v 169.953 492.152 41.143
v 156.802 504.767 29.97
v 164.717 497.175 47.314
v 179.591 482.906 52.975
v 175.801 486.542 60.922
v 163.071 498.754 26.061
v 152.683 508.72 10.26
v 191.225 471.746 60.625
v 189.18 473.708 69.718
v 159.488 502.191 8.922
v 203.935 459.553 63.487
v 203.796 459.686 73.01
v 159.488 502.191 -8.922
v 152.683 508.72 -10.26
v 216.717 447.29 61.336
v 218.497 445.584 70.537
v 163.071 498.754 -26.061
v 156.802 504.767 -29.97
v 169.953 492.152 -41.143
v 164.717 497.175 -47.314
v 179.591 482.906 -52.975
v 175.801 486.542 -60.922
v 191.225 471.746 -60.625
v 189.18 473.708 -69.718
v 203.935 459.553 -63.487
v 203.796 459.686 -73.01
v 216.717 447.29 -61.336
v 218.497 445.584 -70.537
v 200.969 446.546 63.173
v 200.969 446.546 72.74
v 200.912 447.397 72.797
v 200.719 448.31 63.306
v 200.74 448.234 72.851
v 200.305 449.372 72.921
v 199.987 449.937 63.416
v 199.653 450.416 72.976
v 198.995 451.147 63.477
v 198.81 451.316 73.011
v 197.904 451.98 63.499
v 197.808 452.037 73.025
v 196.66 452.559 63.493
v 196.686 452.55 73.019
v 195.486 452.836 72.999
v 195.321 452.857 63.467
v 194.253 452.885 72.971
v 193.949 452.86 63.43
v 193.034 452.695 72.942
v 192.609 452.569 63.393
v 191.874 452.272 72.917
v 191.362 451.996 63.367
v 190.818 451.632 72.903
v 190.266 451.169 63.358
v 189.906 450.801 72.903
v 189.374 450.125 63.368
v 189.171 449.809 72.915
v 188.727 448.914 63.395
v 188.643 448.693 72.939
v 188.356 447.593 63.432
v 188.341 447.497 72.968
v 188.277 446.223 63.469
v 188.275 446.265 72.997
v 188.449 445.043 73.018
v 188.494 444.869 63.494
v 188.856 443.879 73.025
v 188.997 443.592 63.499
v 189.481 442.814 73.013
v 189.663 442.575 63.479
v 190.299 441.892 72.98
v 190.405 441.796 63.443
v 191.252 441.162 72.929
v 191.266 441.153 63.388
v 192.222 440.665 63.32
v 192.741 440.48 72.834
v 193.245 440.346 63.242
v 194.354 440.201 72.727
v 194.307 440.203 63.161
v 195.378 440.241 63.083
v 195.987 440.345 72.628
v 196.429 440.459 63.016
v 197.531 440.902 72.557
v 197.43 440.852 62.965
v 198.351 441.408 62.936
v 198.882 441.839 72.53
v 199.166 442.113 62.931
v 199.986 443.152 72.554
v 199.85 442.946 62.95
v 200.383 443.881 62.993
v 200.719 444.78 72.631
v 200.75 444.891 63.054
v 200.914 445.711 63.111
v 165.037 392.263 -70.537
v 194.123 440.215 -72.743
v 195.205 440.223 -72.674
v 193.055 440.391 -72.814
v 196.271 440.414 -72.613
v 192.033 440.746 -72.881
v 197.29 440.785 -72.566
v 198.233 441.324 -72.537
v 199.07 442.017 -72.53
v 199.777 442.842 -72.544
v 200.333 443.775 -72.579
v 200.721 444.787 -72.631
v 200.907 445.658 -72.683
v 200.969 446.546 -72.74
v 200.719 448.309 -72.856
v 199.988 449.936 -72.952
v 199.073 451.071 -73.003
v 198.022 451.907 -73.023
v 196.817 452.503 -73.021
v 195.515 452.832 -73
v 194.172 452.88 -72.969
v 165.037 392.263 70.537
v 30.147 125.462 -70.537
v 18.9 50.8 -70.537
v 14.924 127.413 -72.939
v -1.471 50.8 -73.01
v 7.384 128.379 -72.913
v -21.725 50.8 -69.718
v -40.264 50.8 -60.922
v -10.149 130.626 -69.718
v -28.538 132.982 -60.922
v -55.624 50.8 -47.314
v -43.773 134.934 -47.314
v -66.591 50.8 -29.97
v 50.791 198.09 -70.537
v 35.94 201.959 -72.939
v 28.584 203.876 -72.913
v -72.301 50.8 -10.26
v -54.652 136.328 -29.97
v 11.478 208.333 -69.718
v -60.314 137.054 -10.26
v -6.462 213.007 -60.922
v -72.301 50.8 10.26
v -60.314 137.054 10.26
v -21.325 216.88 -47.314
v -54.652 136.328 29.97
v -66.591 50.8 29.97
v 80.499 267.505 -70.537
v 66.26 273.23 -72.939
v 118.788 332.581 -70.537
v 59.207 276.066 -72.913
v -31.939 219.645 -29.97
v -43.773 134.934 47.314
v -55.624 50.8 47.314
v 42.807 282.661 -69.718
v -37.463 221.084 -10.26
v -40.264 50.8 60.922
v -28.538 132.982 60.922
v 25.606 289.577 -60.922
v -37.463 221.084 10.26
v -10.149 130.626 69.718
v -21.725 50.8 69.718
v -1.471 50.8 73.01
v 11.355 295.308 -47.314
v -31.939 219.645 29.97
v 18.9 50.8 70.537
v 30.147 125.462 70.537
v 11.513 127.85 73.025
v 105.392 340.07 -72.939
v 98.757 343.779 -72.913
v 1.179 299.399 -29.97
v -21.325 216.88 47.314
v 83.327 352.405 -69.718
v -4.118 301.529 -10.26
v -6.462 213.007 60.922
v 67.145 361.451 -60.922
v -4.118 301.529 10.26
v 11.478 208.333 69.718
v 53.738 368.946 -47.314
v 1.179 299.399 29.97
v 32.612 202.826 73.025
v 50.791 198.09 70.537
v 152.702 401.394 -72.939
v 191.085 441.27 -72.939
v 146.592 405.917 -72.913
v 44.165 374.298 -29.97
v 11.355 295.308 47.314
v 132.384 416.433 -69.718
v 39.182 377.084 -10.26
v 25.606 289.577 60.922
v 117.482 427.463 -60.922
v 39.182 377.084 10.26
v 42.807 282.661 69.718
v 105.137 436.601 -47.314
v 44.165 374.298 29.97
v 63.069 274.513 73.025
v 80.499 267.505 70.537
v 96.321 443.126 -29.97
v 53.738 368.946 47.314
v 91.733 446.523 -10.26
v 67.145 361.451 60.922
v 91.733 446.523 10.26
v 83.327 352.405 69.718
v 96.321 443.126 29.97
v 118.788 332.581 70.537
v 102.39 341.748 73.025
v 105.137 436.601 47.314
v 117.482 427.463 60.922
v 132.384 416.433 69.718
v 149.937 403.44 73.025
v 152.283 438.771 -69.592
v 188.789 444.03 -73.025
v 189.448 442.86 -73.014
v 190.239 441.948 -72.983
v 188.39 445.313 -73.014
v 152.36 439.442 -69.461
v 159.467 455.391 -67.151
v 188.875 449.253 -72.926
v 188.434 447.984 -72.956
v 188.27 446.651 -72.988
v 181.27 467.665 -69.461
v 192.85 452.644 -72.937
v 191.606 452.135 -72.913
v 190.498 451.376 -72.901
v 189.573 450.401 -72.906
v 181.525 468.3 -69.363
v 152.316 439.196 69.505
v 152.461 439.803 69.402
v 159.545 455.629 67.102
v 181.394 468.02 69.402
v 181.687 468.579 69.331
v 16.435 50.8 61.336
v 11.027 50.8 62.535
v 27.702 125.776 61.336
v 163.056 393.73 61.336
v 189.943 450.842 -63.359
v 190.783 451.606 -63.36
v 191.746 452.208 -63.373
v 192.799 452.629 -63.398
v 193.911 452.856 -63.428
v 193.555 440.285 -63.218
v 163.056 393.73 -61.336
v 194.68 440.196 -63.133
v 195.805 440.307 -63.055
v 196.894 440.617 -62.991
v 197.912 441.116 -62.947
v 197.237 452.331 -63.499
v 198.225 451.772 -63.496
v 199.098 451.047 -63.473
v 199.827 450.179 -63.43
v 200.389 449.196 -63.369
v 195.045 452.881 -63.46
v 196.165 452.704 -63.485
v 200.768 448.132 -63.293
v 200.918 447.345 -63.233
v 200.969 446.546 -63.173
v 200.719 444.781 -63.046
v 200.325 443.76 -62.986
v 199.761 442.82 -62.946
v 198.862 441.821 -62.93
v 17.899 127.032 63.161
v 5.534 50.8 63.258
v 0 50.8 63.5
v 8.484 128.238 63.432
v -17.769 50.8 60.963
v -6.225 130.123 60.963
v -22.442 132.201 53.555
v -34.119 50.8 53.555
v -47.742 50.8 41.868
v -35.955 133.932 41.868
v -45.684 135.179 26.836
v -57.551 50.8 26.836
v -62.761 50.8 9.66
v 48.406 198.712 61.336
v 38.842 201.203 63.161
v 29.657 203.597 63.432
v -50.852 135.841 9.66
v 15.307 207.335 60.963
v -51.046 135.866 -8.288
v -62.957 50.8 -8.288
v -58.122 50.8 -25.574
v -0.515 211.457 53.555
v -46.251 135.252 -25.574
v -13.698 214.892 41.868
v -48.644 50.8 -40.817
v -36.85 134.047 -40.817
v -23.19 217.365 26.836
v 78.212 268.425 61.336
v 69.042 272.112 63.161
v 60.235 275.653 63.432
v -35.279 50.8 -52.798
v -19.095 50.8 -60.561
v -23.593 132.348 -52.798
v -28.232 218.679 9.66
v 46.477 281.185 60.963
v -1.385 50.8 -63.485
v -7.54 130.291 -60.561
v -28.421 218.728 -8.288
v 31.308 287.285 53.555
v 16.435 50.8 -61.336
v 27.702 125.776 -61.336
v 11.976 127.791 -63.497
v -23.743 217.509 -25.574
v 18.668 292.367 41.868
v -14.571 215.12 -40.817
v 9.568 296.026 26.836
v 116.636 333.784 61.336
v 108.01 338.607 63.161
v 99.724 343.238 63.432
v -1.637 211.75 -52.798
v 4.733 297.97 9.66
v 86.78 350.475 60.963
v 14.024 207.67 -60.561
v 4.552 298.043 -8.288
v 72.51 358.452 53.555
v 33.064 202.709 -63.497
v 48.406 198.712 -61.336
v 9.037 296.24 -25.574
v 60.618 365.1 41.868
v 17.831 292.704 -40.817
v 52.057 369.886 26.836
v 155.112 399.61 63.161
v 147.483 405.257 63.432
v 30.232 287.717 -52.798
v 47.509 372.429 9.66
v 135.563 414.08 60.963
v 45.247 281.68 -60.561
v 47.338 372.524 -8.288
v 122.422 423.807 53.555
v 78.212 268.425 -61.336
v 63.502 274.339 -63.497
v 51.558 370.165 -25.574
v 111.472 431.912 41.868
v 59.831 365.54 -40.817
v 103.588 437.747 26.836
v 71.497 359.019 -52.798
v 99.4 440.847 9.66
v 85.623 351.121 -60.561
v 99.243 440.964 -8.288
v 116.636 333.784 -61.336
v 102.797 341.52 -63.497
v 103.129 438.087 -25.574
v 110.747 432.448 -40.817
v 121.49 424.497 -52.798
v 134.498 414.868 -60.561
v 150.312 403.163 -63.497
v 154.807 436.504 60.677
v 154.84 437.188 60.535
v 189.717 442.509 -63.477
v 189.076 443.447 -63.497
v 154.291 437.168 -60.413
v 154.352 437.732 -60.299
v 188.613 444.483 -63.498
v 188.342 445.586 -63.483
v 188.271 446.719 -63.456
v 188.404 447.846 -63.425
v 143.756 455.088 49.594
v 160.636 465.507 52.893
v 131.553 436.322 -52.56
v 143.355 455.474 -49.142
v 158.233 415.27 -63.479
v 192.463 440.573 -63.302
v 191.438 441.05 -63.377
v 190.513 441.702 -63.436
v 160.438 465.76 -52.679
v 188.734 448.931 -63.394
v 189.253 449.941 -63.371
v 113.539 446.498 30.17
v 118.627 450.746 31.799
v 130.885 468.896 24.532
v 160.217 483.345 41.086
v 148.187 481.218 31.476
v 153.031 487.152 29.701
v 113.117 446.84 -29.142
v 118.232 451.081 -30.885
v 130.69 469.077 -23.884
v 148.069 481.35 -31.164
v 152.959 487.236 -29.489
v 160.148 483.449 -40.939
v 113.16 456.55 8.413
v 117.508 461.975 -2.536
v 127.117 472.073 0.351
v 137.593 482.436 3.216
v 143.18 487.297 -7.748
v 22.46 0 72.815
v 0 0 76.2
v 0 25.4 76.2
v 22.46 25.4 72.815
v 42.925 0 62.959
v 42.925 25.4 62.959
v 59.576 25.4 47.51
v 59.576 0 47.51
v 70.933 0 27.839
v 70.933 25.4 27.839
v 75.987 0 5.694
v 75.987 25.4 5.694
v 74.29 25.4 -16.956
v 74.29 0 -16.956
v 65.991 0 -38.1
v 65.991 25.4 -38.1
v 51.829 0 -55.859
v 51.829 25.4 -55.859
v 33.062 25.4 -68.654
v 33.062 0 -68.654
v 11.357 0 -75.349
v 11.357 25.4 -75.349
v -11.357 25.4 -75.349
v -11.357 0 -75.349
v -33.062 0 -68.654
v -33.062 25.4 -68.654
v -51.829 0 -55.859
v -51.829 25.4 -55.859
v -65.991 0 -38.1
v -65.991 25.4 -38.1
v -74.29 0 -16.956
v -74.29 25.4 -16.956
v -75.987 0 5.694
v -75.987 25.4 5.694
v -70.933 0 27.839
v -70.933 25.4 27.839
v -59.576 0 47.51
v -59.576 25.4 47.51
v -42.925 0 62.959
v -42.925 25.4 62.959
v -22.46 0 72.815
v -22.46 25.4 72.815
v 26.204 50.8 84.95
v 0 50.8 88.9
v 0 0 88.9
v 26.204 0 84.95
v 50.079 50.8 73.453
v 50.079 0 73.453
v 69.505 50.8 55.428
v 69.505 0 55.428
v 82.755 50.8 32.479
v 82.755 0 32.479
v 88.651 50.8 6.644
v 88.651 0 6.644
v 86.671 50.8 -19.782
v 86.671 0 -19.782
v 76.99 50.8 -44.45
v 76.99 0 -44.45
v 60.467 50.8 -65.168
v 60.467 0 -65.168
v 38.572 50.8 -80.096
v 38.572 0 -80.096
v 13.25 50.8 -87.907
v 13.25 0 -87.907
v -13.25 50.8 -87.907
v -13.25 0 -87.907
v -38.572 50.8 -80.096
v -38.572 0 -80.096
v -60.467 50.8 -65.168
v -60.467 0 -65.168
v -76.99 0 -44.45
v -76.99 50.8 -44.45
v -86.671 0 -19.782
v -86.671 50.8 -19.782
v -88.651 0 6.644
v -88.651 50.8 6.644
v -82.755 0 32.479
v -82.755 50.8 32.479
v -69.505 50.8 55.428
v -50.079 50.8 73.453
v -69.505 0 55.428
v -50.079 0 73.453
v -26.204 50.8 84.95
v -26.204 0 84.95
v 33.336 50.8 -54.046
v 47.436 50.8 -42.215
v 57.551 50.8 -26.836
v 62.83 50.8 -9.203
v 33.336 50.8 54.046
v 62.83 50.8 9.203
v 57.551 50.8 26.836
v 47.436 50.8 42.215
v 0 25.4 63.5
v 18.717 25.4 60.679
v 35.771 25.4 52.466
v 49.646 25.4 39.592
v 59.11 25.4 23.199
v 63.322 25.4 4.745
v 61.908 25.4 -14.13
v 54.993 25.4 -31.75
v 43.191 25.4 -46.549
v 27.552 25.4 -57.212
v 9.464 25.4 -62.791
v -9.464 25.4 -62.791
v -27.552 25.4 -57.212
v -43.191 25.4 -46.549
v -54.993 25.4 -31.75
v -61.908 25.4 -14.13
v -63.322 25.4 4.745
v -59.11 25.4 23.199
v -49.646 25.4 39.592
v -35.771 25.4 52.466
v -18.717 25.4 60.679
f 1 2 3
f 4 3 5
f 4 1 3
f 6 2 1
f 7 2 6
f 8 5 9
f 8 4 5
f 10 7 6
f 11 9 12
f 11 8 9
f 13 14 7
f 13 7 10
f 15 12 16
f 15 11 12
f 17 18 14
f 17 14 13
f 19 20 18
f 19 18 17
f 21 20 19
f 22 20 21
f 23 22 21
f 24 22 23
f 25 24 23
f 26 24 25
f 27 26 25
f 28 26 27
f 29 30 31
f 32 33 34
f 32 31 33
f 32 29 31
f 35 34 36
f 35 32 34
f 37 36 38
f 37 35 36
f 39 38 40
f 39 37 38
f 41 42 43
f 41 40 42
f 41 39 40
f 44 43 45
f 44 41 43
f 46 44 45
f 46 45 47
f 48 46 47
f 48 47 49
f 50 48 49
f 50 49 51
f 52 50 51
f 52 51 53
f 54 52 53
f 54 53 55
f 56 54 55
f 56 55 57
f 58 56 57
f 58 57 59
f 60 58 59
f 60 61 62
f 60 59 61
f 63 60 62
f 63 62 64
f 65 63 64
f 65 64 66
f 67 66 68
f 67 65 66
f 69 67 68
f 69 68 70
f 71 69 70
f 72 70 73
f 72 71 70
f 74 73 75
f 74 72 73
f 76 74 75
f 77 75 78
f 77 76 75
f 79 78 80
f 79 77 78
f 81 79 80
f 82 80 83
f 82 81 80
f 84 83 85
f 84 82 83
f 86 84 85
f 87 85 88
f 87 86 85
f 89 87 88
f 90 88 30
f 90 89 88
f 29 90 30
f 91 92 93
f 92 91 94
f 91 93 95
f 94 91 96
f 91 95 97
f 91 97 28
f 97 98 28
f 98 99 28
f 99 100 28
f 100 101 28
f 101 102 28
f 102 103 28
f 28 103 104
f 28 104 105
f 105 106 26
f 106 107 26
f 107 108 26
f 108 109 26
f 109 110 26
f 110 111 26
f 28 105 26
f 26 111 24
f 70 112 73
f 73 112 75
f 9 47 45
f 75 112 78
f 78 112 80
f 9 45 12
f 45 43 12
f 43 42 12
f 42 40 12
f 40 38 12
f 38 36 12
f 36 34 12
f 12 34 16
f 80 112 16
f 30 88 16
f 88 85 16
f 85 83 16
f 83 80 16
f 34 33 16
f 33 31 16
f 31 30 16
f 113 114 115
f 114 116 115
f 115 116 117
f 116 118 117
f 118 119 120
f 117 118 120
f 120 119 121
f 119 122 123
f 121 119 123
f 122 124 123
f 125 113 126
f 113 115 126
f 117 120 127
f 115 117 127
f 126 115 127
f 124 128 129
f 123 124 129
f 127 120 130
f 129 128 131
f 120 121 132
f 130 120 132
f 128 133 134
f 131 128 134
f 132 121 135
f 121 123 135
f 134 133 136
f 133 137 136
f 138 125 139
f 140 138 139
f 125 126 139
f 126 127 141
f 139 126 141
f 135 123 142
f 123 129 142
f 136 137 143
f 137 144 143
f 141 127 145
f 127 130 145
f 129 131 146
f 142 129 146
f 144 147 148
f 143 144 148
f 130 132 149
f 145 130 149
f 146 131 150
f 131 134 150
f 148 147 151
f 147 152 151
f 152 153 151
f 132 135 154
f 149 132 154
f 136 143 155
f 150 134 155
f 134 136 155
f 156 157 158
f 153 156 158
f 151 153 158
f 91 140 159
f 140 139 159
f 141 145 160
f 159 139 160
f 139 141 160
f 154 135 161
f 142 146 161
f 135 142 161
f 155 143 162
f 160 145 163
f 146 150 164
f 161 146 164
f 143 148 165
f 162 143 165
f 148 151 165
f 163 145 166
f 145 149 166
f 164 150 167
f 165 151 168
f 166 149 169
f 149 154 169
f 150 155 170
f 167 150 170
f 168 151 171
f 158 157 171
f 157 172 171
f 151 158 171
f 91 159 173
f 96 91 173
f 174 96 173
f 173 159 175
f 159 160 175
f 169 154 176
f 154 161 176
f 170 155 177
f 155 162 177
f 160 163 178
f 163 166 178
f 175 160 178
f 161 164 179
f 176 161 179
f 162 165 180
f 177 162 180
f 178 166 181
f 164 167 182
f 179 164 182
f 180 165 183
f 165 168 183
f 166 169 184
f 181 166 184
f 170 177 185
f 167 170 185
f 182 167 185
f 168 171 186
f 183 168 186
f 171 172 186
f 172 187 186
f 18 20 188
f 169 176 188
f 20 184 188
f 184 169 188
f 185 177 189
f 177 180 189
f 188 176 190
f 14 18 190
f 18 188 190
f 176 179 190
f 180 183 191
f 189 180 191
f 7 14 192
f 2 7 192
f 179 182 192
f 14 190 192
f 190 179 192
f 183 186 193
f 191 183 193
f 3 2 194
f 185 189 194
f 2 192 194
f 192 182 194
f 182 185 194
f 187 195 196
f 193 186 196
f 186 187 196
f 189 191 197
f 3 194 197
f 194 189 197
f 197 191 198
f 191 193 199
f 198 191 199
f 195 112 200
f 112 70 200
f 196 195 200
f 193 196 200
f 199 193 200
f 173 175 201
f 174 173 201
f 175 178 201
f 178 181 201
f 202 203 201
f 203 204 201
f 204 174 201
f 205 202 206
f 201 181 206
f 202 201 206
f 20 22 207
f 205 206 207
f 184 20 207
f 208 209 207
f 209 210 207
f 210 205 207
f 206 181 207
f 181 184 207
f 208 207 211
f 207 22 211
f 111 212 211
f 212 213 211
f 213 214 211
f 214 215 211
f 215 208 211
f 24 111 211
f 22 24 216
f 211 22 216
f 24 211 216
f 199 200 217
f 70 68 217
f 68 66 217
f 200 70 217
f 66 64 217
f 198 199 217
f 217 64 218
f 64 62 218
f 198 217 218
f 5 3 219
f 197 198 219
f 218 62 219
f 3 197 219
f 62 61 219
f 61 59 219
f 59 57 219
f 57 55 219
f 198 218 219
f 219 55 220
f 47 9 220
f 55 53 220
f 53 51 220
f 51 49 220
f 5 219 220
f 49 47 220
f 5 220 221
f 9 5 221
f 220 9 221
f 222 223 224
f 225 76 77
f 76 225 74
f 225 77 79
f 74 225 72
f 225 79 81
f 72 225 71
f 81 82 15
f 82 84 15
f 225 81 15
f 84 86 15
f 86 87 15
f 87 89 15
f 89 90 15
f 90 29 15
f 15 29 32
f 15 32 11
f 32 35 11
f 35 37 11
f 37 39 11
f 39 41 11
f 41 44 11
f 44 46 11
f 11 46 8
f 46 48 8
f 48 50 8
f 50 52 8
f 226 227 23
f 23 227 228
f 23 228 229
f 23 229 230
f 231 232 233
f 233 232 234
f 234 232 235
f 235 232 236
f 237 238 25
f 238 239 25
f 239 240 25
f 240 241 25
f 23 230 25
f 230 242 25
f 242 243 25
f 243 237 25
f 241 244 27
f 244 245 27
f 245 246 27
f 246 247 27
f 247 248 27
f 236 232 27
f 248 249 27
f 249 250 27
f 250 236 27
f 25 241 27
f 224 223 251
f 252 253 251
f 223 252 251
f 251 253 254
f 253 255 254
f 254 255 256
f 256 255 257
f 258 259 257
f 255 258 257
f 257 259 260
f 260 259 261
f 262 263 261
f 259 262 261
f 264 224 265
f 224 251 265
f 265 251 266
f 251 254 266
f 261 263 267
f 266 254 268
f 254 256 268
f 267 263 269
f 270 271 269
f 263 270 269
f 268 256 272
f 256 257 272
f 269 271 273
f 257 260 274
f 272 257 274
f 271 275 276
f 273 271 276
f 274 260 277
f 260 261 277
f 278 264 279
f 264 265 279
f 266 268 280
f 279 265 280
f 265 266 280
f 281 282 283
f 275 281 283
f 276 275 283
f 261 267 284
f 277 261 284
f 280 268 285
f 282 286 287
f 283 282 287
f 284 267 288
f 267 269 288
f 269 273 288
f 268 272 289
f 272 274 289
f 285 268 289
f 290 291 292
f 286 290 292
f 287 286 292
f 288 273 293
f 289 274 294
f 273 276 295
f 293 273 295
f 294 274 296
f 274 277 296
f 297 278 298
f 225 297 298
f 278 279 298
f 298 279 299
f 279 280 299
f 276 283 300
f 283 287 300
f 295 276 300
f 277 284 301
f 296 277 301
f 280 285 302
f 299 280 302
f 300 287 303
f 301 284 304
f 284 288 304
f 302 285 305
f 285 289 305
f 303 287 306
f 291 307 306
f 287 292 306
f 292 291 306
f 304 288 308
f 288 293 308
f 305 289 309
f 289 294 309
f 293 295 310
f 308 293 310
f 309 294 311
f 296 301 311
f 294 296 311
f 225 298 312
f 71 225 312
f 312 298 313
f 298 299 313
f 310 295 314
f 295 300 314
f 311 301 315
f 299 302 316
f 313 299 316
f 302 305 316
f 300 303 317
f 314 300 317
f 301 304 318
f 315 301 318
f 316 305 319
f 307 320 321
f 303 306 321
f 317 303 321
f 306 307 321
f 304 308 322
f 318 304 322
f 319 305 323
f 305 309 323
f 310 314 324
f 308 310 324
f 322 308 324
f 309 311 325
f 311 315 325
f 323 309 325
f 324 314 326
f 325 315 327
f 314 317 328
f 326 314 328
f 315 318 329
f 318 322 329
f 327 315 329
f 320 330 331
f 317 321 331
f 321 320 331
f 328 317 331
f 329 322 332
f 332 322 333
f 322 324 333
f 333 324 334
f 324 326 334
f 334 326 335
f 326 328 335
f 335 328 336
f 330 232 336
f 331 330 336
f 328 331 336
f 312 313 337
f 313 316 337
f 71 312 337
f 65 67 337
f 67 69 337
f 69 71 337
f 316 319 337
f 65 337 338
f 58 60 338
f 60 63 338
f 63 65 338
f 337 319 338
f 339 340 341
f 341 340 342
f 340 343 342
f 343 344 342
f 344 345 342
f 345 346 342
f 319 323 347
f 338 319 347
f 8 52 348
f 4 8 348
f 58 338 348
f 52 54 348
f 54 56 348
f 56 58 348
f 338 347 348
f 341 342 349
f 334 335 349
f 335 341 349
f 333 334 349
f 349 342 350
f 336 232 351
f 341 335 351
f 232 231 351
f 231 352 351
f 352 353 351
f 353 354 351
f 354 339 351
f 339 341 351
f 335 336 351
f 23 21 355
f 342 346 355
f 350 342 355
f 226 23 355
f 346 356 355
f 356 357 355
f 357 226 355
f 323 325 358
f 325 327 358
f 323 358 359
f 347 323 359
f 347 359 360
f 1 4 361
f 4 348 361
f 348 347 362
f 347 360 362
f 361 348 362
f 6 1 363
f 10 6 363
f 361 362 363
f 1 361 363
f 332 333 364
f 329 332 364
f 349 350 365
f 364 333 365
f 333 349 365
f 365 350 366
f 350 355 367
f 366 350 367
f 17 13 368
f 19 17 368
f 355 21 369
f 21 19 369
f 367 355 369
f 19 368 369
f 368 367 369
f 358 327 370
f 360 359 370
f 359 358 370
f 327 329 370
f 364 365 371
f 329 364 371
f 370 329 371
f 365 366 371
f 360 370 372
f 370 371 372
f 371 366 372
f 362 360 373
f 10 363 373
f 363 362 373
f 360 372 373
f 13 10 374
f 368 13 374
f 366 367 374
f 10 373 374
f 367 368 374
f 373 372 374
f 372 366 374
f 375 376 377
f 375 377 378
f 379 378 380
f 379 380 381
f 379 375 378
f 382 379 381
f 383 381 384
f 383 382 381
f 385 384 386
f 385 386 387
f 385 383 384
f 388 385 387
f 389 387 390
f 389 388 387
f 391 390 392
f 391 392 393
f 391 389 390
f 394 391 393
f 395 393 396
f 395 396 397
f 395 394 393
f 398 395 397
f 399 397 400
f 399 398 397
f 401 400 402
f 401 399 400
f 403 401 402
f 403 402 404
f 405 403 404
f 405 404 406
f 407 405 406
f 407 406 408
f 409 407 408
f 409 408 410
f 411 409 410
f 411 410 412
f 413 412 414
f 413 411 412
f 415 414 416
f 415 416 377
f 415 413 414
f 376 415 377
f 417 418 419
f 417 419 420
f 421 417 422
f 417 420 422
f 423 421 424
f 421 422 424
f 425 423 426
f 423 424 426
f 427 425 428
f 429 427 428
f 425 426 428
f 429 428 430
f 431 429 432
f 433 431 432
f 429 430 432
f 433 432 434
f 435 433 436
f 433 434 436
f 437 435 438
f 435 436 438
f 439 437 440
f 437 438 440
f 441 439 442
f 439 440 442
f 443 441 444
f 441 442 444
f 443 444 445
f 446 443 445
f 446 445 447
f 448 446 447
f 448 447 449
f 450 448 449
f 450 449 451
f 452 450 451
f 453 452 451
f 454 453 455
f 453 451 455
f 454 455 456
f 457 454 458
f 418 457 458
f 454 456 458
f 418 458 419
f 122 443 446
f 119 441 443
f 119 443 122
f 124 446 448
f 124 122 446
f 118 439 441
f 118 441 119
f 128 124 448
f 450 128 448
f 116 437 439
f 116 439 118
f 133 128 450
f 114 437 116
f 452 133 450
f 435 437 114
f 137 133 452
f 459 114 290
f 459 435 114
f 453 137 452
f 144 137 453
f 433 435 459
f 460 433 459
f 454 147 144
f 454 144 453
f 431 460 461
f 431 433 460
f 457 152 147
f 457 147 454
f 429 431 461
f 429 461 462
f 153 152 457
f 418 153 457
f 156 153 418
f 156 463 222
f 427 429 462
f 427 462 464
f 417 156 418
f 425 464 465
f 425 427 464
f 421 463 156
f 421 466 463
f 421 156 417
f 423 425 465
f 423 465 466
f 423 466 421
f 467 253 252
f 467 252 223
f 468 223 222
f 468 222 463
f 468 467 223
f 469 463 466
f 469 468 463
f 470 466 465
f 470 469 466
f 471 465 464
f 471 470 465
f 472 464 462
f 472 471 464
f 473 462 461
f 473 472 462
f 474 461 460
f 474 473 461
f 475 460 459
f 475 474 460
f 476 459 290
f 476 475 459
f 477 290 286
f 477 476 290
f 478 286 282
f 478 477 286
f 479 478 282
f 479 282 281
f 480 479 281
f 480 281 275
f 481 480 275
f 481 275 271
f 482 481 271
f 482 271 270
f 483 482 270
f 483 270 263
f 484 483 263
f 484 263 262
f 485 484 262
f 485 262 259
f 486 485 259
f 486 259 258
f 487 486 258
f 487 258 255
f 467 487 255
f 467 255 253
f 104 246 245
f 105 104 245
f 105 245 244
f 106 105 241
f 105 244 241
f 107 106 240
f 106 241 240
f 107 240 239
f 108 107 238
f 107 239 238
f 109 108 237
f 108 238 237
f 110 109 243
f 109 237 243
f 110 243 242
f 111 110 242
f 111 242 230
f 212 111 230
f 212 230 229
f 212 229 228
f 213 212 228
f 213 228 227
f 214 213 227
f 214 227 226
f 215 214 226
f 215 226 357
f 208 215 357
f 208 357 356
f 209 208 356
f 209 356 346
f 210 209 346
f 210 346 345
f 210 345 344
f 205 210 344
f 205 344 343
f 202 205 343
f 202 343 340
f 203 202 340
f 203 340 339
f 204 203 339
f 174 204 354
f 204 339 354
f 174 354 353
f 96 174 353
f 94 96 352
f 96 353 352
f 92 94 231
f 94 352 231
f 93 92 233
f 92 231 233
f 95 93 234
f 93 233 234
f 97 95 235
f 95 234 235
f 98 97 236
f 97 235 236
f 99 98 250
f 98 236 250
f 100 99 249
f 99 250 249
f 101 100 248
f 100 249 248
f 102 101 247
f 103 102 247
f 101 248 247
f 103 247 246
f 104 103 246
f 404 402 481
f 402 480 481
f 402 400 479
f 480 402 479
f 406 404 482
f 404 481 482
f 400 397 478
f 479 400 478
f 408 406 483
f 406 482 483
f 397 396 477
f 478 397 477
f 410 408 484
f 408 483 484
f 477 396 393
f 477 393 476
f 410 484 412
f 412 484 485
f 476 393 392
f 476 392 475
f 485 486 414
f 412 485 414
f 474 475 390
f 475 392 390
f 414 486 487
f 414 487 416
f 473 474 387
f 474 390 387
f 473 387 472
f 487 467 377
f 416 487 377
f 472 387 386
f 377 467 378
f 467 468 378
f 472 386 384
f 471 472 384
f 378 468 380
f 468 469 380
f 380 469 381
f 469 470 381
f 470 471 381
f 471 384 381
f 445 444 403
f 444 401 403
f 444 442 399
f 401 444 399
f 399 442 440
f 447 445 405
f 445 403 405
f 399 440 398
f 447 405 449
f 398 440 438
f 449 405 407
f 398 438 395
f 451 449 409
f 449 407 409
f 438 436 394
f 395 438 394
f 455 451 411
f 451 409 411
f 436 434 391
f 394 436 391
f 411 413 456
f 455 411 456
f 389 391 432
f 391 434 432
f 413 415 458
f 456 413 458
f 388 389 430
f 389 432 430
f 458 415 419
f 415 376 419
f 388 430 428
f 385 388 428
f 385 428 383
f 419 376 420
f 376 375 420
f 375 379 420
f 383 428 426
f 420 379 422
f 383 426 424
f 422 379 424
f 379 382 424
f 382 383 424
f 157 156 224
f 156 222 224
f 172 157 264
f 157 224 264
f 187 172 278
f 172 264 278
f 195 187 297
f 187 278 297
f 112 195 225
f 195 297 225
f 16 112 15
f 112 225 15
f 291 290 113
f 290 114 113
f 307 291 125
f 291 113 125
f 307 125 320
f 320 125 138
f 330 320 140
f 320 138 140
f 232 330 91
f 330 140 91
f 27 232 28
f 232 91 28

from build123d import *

# Parameters (mm, degrees)
SKETCH2_R               = 88.9
SKETCH2_R_2             = 63.5
BOSS_EXTRUDE1_DEPTH     = 50.8
SKETCH2_4_R             = 76.2
SKETCH2_4_R_2           = 63.5
CUT_EXTRUDE1_DEPTH      = 25.4
CUT_EXTRUDE2_DEPTH      = 562.204013319
CUT_EXTRUDE2_DEPTH_BACK = 562.204013319
SKETCH5_R               = 6.35


with BuildPart() as part:
    # Sketch2 → Boss-Extrude1 (new body)
    with BuildSketch(Plane(origin=(0, 0, 0), x_dir=(1, 0, 0), z_dir=(0, 1, 0))):
        Circle(SKETCH2_R)
        Circle(SKETCH2_R_2, mode=Mode.SUBTRACT)
    extrude(amount=BOSS_EXTRUDE1_DEPTH)

    # Sketch2<4> → Cut-Extrude1 (cut)
    with BuildSketch(Plane(origin=(0, 0, 0), x_dir=(1, 0, 0), z_dir=(0, 1, 0))):
        Circle(SKETCH2_4_R)
        Circle(SKETCH2_4_R_2, mode=Mode.SUBTRACT)
    extrude(amount=CUT_EXTRUDE1_DEPTH, mode=Mode.SUBTRACT)

    # Sweep1: sweep along a path in Sketch3
    with BuildLine(Plane.XY) as sweep1_path:
        ThreePointArc((2.12035425, 50.8), (64.93047334, 273.764984481), (206.387500194, 457.2))
    # Sketch4 → Sweep1 (sweep)
    with BuildSketch(Plane(origin=(0, 50.8, 0), x_dir=(1, 0, 0), z_dir=(0, 1, 0))):
        with BuildLine():
            Line((16.435009364, 61.336289969), (18.900260769, 70.536733465))
            ThreePointArc((18.900260769, 70.536733465), (-73.025, 0), (18.900260769, -70.536733465))
            Line((18.900260769, -70.536733465), (16.435009364, -61.336289969))
            ThreePointArc((16.435009364, -61.336289969), (-63.5, 0), (16.435009364, 61.336289969))
        make_face()
    sweep(path=sweep1_path.line)

    # Sketch5 → Cut-Extrude2 (cut, two sides: drawn at the far end of the back side and taken through both)
    with BuildSketch(Plane.XY.offset(-CUT_EXTRUDE2_DEPTH_BACK)):
        with Locations((194.61898253, 446.545535349)):
            Circle(SKETCH5_R)
    extrude(amount=CUT_EXTRUDE2_DEPTH + CUT_EXTRUDE2_DEPTH_BACK, mode=Mode.SUBTRACT)


solid = part.part
